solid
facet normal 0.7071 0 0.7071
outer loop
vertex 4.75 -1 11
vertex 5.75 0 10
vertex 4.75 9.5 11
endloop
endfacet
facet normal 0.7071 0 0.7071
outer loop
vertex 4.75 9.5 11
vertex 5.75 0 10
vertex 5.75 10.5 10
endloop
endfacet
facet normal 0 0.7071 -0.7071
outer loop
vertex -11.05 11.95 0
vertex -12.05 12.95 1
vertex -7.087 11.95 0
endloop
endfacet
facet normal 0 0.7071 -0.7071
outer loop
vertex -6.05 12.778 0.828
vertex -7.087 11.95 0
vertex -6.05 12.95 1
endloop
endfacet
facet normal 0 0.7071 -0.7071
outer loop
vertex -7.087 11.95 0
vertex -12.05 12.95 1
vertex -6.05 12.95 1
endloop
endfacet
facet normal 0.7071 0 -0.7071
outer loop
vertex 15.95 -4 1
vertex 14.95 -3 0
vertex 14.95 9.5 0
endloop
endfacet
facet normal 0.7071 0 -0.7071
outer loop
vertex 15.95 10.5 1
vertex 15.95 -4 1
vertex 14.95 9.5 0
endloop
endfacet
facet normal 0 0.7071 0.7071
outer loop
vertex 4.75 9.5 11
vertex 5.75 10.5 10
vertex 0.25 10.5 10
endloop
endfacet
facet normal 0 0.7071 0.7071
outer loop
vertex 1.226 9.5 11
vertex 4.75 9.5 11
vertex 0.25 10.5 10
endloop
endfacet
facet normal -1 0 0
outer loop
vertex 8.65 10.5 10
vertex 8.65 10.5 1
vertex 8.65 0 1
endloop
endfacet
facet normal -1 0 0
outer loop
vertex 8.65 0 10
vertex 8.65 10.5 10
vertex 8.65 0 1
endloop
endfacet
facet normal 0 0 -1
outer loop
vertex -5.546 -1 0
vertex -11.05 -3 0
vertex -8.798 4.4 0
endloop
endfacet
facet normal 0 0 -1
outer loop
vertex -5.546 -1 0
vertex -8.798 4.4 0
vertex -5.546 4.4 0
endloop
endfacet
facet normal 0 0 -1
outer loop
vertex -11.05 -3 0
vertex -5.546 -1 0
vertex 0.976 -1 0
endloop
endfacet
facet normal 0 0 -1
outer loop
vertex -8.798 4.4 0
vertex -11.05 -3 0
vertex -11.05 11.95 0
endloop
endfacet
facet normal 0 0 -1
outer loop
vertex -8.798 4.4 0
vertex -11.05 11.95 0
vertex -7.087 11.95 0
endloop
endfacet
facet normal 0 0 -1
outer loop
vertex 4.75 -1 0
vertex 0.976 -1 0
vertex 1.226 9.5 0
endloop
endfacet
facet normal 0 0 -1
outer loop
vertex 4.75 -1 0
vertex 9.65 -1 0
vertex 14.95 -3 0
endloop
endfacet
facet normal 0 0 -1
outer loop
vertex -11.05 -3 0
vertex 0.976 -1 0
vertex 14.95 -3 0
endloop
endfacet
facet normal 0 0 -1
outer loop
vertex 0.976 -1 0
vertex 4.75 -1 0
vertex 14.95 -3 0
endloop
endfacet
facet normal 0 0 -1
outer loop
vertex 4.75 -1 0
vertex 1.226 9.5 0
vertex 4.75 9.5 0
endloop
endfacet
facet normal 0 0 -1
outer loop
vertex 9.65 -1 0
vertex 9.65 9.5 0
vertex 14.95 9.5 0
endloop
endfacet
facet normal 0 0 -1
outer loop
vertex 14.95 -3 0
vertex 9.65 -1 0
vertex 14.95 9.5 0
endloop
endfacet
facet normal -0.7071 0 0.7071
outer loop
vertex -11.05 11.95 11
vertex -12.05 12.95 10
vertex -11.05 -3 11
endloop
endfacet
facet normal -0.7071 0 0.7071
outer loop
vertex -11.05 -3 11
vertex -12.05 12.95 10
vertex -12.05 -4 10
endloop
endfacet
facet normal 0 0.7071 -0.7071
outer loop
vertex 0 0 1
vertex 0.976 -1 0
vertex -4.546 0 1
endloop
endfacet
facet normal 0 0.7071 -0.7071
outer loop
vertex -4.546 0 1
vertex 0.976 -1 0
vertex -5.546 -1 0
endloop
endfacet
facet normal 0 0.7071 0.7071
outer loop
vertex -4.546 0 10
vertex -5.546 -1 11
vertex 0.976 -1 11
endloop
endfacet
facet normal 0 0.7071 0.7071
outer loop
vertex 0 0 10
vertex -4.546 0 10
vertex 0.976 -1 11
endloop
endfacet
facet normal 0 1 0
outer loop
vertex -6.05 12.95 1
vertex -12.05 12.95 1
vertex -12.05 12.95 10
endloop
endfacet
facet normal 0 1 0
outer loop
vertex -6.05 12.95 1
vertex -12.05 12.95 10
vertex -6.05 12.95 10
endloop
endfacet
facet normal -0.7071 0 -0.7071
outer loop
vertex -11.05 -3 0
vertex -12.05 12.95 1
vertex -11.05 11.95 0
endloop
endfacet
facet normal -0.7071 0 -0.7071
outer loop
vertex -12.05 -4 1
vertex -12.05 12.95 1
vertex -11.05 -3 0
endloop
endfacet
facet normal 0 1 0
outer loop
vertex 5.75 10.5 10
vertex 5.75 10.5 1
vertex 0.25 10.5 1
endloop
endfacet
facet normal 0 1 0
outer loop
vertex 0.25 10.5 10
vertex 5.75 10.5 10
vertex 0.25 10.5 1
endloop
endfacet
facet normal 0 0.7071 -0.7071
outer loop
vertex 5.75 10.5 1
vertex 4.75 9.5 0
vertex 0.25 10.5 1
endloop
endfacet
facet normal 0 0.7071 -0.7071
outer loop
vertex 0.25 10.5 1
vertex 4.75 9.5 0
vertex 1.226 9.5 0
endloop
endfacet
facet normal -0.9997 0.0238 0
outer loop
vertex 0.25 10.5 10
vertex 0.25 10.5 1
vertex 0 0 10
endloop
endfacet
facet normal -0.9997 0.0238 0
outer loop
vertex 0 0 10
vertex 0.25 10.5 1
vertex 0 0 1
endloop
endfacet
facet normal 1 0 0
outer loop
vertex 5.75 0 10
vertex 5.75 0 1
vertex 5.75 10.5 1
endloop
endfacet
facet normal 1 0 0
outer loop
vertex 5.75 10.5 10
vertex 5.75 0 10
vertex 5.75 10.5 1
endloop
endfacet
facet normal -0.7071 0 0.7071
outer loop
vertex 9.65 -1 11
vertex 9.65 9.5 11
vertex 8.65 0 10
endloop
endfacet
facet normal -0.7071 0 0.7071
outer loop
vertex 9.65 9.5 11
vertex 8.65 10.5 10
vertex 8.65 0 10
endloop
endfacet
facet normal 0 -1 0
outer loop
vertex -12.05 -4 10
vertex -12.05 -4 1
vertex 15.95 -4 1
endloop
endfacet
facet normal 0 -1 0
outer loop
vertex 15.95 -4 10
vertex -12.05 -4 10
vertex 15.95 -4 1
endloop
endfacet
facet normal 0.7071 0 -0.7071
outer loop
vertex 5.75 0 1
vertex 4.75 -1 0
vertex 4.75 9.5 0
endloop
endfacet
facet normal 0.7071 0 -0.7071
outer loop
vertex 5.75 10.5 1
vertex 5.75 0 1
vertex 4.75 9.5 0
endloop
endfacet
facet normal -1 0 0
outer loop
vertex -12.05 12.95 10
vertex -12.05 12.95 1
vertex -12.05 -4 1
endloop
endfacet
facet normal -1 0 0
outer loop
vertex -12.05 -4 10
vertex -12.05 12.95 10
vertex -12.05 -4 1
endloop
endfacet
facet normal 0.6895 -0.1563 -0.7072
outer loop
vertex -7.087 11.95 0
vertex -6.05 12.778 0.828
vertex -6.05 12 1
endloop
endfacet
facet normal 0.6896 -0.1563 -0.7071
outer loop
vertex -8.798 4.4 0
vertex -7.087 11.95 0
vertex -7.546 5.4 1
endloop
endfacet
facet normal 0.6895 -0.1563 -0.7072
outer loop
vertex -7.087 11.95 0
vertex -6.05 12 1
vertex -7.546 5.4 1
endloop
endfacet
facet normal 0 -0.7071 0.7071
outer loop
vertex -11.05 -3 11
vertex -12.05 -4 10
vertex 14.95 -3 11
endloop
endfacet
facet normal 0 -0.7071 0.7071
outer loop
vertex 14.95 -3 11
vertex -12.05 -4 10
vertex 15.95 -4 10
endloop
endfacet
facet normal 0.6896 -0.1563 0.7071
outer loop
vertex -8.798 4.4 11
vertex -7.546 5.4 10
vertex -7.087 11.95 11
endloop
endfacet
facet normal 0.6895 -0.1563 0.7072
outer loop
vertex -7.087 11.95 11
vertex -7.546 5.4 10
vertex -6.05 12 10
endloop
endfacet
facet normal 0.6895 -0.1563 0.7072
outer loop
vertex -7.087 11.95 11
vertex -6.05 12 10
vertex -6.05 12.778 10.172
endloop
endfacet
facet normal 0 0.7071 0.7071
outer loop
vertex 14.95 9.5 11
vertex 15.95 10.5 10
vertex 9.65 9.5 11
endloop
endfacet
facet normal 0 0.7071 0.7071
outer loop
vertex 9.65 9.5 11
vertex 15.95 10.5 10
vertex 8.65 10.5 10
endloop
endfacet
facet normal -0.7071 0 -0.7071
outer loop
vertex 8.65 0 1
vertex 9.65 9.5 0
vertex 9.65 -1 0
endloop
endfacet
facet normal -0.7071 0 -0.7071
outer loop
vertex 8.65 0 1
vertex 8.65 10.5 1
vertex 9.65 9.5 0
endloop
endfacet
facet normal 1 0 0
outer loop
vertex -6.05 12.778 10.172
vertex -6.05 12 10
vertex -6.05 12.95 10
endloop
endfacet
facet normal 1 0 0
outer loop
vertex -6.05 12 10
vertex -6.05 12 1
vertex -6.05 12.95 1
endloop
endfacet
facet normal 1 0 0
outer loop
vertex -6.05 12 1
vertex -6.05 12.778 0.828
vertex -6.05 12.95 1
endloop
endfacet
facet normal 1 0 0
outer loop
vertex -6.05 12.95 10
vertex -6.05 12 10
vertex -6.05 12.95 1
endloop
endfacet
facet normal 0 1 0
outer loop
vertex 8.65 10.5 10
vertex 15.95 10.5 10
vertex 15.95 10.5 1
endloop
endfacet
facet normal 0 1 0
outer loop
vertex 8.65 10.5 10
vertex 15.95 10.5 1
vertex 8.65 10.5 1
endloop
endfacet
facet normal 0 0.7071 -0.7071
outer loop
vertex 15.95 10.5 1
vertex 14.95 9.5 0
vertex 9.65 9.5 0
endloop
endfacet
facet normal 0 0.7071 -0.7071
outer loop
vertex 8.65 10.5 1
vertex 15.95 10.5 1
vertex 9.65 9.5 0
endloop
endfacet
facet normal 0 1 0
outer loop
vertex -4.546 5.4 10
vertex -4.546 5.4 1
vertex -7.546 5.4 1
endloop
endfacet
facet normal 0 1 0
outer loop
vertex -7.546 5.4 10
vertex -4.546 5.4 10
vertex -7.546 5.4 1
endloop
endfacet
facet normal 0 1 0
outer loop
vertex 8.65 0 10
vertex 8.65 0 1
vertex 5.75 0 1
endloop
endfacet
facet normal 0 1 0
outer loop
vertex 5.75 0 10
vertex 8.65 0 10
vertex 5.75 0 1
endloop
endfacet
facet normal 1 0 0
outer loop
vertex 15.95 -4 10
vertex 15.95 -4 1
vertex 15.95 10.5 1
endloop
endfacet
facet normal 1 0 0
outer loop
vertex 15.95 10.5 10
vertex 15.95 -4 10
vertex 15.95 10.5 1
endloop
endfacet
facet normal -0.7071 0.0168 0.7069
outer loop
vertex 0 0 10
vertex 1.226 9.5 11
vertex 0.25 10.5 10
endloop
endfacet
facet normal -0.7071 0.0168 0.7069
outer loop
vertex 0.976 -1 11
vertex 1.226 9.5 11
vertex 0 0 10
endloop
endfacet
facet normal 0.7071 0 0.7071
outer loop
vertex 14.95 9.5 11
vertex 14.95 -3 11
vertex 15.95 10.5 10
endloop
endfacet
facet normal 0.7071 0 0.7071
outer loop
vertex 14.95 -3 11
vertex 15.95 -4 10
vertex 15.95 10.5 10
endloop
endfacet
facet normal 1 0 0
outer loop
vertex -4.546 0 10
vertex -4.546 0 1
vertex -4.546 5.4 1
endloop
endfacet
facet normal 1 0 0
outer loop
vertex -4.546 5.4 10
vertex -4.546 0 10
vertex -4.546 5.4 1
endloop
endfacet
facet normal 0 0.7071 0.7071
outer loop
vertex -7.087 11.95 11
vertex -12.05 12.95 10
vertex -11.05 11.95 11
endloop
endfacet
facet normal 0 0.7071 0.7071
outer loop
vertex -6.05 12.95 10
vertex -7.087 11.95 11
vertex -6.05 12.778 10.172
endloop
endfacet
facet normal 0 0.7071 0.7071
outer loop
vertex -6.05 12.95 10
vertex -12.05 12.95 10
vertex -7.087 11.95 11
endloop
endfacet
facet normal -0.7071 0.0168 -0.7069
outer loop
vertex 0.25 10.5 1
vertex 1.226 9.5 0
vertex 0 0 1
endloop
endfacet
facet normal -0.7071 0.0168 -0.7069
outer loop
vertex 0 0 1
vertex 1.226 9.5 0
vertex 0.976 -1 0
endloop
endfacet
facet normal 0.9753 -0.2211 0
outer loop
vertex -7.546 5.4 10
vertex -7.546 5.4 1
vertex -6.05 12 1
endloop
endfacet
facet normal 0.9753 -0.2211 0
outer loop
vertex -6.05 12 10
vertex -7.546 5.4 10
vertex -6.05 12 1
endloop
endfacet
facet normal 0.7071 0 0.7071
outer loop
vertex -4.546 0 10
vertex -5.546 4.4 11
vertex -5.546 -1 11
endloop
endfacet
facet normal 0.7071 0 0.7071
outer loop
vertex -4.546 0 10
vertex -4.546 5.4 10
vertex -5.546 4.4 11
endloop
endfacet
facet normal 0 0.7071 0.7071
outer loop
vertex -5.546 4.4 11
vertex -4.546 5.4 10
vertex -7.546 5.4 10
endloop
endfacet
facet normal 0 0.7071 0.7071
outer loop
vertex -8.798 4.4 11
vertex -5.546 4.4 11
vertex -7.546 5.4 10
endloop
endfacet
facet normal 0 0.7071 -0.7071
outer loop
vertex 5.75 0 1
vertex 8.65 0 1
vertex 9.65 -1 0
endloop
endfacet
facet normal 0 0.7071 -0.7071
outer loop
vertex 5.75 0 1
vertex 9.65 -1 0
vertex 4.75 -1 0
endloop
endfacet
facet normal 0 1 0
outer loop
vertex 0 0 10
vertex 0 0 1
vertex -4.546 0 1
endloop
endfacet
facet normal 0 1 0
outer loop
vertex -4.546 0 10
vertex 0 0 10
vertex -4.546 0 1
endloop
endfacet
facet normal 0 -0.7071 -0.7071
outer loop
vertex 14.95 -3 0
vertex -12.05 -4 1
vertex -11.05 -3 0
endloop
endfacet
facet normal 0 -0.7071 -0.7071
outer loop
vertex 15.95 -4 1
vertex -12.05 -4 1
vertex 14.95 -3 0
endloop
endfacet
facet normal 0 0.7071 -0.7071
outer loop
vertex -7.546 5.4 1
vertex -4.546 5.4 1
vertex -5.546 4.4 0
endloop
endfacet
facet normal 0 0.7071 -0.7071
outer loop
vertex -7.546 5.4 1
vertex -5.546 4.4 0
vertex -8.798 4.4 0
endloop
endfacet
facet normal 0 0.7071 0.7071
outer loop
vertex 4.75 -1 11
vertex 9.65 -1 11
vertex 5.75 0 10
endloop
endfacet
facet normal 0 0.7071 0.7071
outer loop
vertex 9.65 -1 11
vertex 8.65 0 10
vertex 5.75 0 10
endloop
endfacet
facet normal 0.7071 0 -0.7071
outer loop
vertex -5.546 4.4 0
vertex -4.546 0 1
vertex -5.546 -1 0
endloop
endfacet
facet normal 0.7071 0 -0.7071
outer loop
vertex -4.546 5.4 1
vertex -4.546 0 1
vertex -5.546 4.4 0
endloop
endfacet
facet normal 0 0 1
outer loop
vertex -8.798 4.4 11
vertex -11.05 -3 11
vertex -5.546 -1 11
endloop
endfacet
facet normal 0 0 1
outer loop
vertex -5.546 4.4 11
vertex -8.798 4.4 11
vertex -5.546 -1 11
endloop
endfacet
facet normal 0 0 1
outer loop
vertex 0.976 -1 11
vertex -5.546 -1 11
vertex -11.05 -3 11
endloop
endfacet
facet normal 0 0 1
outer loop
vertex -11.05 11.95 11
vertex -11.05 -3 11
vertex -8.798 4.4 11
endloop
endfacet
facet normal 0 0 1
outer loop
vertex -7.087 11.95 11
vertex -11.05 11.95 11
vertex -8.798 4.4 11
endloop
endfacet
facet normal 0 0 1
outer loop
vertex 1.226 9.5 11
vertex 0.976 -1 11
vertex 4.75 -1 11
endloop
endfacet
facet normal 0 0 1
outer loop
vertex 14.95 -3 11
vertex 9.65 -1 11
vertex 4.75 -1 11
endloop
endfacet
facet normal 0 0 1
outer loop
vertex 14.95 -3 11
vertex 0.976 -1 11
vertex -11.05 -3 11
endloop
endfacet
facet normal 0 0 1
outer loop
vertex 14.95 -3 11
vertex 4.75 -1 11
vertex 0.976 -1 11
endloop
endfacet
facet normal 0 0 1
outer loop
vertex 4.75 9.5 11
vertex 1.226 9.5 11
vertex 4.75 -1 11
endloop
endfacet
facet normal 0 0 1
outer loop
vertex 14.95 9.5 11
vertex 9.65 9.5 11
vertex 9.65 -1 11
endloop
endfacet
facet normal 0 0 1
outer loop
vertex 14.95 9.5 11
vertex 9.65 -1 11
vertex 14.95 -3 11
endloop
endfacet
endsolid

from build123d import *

# Parameters (mm, degrees)
F0_W        = 6
F0_H        = 0.95
F1_DEPTH    = 11
F2_C1_SIZE  = 1
F2_C2_SIZE  = 1
F2_C3_SIZE  = 1
F2_C4_SIZE  = 1
F2_C5_SIZE  = 1
F2_C6_SIZE  = 1
F2_C7_SIZE  = 1
F2_C8_SIZE  = 1
F2_C9_SIZE  = 1
F2_C10_SIZE = 1
F2_C11_SIZE = 1
F2_C12_SIZE = 0.9999
F2_C13_SIZE = 1
F2_C14_SIZE = 1
F3_C1_SIZE  = 1
F3_C2_SIZE  = 1
F3_C3_SIZE  = 1
F3_C4_SIZE  = 1
F3_C5_SIZE  = 1
F3_C6_SIZE  = 0.9999
F3_C7_SIZE  = 1
F3_C8_SIZE  = 1
F3_C9_SIZE  = 1
F3_C10_SIZE = 1
F3_C11_SIZE = 1
F3_C12_SIZE = 1
F3_C13_SIZE = 1
F3_C14_SIZE = 1


# Not quite as in the source:
# - a fillet or chamfer is up to 0.001 mm smaller than in the source, because OpenCascade refuses the exact size


with BuildPart() as f1:
    # F0 (on Top) → F1 (new body)
    with BuildSketch(Plane.XY):
        Polygon((0.25, 10.5), (0, 0), (-4.546, 0), (-8.77, 0), (-7.546, 5.4), (-6.05, 12), (-12.05, 12), (-12.05, -4), (15.95, -4), (15.95, 10.5), (8.65, 10.5), (8.65, 0), (5.75, 0), (5.75, 10.5), align=None)
        Polygon((-8.77, 0), (-4.546, 0), (-4.546, 5.4), (-7.546, 5.4), align=None)
        with Locations((-9.05, 12.475)):
            Rectangle(F0_W, F0_H)
    extrude(amount=F1_DEPTH)

    # F2: chamfer of 1 on 14 edges, made by hand

    # F2_c1
    f2_c1_edges = [f1.edges().sort_by_distance(p)[0] for p in [
        (0.125, 5.25, 11),
    ]]
    chamfer(f2_c1_edges, length=F2_C1_SIZE)

    # F2_c2
    f2_c2_edges = [f1.edges().sort_by_distance(p)[0] for p in [
        (-2.273, 0, 11),
    ]]
    chamfer(f2_c2_edges, length=F2_C2_SIZE)

    # F2_c3
    f2_c3_edges = [f1.edges().sort_by_distance(p)[0] for p in [
        (-4.546, 2.7, 11),
    ]]
    chamfer(f2_c3_edges, length=F2_C3_SIZE)

    # F2_c4
    f2_c4_edges = [f1.edges().sort_by_distance(p)[0] for p in [
        (-6.546, 5.4, 11),
    ]]
    chamfer(f2_c4_edges, length=F2_C4_SIZE)

    # F2_c5
    f2_c5_edges = [f1.edges().sort_by_distance(p)[0] for p in [
        (-6.798, 8.7, 11),
    ]]
    chamfer(f2_c5_edges, length=F2_C5_SIZE)

    # F2_c6
    f2_c6_edges = [f1.edges().sort_by_distance(p)[0] for p in [
        (-9.4550169048, 12.95, 11),
    ]]
    chamfer(f2_c6_edges, length=F2_C6_SIZE)

    # F2_c7
    f2_c7_edges = [f1.edges().sort_by_distance(p)[0] for p in [
        (-12.05, 3.975, 11),
    ]]
    chamfer(f2_c7_edges, length=F2_C7_SIZE)

    # F2_c8
    f2_c8_edges = [f1.edges().sort_by_distance(p)[0] for p in [
        (2.45, -4, 11),
    ]]
    chamfer(f2_c8_edges, length=F2_C8_SIZE)

    # F2_c9
    f2_c9_edges = [f1.edges().sort_by_distance(p)[0] for p in [
        (15.95, 3.75, 11),
    ]]
    chamfer(f2_c9_edges, length=F2_C9_SIZE)

    # F2_c10
    f2_c10_edges = [f1.edges().sort_by_distance(p)[0] for p in [
        (11.8, 10.5, 11),
    ]]
    chamfer(f2_c10_edges, length=F2_C10_SIZE)

    # F2_c11
    f2_c11_edges = [f1.edges().sort_by_distance(p)[0] for p in [
        (8.65, 4.75, 11),
    ]]
    chamfer(f2_c11_edges, length=F2_C11_SIZE)

    # F2_c12 (size 1 in the source; OpenCascade refuses exactly that, so slightly less here)
    f2_c12_edges = [f1.edges().sort_by_distance(p)[0] for p in [
        (7.2, 0, 11),
    ]]
    chamfer(f2_c12_edges, length=F2_C12_SIZE)

    # F2_c13
    f2_c13_edges = [f1.edges().sort_by_distance(p)[0] for p in [
        (5.75, 5.25, 11),
    ]]
    chamfer(f2_c13_edges, length=F2_C13_SIZE)

    # F2_c14
    f2_c14_edges = [f1.edges().sort_by_distance(p)[0] for p in [
        (3.0001417033, 10.5, 11),
    ]]
    chamfer(f2_c14_edges, length=F2_C14_SIZE)

    # F3: chamfer of 1 on 14 edges, made by hand

    # F3_c1
    f3_c1_edges = [f1.edges().sort_by_distance(p)[0] for p in [
        (5.75, 5.25, 0),
    ]]
    chamfer(f3_c1_edges, length=F3_C1_SIZE)

    # F3_c2
    f3_c2_edges = [f1.edges().sort_by_distance(p)[0] for p in [
        (7.2, 0, 0),
    ]]
    chamfer(f3_c2_edges, length=F3_C2_SIZE)

    # F3_c3
    f3_c3_edges = [f1.edges().sort_by_distance(p)[0] for p in [
        (2.5, 10.5, 0),
    ]]
    chamfer(f3_c3_edges, length=F3_C3_SIZE)

    # F3_c4
    f3_c4_edges = [f1.edges().sort_by_distance(p)[0] for p in [
        (0.1130952381, 4.75, 0),
    ]]
    chamfer(f3_c4_edges, length=F3_C4_SIZE)

    # F3_c5
    f3_c5_edges = [f1.edges().sort_by_distance(p)[0] for p in [
        (8.65, 5.25, 0),
    ]]
    chamfer(f3_c5_edges, length=F3_C5_SIZE)

    # F3_c6 (size 1 in the source; OpenCascade refuses exactly that, so slightly less here)
    f3_c6_edges = [f1.edges().sort_by_distance(p)[0] for p in [
        (-2.273, 0, 0),
    ]]
    chamfer(f3_c6_edges, length=F3_C6_SIZE)

    # F3_c7
    f3_c7_edges = [f1.edges().sort_by_distance(p)[0] for p in [
        (12.8, 10.5, 0),
    ]]
    chamfer(f3_c7_edges, length=F3_C7_SIZE)

    # F3_c8
    f3_c8_edges = [f1.edges().sort_by_distance(p)[0] for p in [
        (15.95, 2.75, 0),
    ]]
    chamfer(f3_c8_edges, length=F3_C8_SIZE)

    # F3_c9
    f3_c9_edges = [f1.edges().sort_by_distance(p)[0] for p in [
        (-4.546, 2.7, 0),
    ]]
    chamfer(f3_c9_edges, length=F3_C9_SIZE)

    # F3_c10
    f3_c10_edges = [f1.edges().sort_by_distance(p)[0] for p in [
        (1.45, -4, 0),
    ]]
    chamfer(f3_c10_edges, length=F3_C10_SIZE)

    # F3_c11
    f3_c11_edges = [f1.edges().sort_by_distance(p)[0] for p in [
        (-6.546, 5.4, 0),
    ]]
    chamfer(f3_c11_edges, length=F3_C11_SIZE)

    # F3_c12
    f3_c12_edges = [f1.edges().sort_by_distance(p)[0] for p in [
        (-12.05, 4.975, 0),
    ]]
    chamfer(f3_c12_edges, length=F3_C12_SIZE)

    # F3_c13
    f3_c13_edges = [f1.edges().sort_by_distance(p)[0] for p in [
        (-8.55, 12.95, 0),
    ]]
    chamfer(f3_c13_edges, length=F3_C13_SIZE)

    # F3_c14
    f3_c14_edges = [f1.edges().sort_by_distance(p)[0] for p in [
        (-6.8036666667, 8.675, 0),
    ]]
    chamfer(f3_c14_edges, length=F3_C14_SIZE)


solid = f1.part
